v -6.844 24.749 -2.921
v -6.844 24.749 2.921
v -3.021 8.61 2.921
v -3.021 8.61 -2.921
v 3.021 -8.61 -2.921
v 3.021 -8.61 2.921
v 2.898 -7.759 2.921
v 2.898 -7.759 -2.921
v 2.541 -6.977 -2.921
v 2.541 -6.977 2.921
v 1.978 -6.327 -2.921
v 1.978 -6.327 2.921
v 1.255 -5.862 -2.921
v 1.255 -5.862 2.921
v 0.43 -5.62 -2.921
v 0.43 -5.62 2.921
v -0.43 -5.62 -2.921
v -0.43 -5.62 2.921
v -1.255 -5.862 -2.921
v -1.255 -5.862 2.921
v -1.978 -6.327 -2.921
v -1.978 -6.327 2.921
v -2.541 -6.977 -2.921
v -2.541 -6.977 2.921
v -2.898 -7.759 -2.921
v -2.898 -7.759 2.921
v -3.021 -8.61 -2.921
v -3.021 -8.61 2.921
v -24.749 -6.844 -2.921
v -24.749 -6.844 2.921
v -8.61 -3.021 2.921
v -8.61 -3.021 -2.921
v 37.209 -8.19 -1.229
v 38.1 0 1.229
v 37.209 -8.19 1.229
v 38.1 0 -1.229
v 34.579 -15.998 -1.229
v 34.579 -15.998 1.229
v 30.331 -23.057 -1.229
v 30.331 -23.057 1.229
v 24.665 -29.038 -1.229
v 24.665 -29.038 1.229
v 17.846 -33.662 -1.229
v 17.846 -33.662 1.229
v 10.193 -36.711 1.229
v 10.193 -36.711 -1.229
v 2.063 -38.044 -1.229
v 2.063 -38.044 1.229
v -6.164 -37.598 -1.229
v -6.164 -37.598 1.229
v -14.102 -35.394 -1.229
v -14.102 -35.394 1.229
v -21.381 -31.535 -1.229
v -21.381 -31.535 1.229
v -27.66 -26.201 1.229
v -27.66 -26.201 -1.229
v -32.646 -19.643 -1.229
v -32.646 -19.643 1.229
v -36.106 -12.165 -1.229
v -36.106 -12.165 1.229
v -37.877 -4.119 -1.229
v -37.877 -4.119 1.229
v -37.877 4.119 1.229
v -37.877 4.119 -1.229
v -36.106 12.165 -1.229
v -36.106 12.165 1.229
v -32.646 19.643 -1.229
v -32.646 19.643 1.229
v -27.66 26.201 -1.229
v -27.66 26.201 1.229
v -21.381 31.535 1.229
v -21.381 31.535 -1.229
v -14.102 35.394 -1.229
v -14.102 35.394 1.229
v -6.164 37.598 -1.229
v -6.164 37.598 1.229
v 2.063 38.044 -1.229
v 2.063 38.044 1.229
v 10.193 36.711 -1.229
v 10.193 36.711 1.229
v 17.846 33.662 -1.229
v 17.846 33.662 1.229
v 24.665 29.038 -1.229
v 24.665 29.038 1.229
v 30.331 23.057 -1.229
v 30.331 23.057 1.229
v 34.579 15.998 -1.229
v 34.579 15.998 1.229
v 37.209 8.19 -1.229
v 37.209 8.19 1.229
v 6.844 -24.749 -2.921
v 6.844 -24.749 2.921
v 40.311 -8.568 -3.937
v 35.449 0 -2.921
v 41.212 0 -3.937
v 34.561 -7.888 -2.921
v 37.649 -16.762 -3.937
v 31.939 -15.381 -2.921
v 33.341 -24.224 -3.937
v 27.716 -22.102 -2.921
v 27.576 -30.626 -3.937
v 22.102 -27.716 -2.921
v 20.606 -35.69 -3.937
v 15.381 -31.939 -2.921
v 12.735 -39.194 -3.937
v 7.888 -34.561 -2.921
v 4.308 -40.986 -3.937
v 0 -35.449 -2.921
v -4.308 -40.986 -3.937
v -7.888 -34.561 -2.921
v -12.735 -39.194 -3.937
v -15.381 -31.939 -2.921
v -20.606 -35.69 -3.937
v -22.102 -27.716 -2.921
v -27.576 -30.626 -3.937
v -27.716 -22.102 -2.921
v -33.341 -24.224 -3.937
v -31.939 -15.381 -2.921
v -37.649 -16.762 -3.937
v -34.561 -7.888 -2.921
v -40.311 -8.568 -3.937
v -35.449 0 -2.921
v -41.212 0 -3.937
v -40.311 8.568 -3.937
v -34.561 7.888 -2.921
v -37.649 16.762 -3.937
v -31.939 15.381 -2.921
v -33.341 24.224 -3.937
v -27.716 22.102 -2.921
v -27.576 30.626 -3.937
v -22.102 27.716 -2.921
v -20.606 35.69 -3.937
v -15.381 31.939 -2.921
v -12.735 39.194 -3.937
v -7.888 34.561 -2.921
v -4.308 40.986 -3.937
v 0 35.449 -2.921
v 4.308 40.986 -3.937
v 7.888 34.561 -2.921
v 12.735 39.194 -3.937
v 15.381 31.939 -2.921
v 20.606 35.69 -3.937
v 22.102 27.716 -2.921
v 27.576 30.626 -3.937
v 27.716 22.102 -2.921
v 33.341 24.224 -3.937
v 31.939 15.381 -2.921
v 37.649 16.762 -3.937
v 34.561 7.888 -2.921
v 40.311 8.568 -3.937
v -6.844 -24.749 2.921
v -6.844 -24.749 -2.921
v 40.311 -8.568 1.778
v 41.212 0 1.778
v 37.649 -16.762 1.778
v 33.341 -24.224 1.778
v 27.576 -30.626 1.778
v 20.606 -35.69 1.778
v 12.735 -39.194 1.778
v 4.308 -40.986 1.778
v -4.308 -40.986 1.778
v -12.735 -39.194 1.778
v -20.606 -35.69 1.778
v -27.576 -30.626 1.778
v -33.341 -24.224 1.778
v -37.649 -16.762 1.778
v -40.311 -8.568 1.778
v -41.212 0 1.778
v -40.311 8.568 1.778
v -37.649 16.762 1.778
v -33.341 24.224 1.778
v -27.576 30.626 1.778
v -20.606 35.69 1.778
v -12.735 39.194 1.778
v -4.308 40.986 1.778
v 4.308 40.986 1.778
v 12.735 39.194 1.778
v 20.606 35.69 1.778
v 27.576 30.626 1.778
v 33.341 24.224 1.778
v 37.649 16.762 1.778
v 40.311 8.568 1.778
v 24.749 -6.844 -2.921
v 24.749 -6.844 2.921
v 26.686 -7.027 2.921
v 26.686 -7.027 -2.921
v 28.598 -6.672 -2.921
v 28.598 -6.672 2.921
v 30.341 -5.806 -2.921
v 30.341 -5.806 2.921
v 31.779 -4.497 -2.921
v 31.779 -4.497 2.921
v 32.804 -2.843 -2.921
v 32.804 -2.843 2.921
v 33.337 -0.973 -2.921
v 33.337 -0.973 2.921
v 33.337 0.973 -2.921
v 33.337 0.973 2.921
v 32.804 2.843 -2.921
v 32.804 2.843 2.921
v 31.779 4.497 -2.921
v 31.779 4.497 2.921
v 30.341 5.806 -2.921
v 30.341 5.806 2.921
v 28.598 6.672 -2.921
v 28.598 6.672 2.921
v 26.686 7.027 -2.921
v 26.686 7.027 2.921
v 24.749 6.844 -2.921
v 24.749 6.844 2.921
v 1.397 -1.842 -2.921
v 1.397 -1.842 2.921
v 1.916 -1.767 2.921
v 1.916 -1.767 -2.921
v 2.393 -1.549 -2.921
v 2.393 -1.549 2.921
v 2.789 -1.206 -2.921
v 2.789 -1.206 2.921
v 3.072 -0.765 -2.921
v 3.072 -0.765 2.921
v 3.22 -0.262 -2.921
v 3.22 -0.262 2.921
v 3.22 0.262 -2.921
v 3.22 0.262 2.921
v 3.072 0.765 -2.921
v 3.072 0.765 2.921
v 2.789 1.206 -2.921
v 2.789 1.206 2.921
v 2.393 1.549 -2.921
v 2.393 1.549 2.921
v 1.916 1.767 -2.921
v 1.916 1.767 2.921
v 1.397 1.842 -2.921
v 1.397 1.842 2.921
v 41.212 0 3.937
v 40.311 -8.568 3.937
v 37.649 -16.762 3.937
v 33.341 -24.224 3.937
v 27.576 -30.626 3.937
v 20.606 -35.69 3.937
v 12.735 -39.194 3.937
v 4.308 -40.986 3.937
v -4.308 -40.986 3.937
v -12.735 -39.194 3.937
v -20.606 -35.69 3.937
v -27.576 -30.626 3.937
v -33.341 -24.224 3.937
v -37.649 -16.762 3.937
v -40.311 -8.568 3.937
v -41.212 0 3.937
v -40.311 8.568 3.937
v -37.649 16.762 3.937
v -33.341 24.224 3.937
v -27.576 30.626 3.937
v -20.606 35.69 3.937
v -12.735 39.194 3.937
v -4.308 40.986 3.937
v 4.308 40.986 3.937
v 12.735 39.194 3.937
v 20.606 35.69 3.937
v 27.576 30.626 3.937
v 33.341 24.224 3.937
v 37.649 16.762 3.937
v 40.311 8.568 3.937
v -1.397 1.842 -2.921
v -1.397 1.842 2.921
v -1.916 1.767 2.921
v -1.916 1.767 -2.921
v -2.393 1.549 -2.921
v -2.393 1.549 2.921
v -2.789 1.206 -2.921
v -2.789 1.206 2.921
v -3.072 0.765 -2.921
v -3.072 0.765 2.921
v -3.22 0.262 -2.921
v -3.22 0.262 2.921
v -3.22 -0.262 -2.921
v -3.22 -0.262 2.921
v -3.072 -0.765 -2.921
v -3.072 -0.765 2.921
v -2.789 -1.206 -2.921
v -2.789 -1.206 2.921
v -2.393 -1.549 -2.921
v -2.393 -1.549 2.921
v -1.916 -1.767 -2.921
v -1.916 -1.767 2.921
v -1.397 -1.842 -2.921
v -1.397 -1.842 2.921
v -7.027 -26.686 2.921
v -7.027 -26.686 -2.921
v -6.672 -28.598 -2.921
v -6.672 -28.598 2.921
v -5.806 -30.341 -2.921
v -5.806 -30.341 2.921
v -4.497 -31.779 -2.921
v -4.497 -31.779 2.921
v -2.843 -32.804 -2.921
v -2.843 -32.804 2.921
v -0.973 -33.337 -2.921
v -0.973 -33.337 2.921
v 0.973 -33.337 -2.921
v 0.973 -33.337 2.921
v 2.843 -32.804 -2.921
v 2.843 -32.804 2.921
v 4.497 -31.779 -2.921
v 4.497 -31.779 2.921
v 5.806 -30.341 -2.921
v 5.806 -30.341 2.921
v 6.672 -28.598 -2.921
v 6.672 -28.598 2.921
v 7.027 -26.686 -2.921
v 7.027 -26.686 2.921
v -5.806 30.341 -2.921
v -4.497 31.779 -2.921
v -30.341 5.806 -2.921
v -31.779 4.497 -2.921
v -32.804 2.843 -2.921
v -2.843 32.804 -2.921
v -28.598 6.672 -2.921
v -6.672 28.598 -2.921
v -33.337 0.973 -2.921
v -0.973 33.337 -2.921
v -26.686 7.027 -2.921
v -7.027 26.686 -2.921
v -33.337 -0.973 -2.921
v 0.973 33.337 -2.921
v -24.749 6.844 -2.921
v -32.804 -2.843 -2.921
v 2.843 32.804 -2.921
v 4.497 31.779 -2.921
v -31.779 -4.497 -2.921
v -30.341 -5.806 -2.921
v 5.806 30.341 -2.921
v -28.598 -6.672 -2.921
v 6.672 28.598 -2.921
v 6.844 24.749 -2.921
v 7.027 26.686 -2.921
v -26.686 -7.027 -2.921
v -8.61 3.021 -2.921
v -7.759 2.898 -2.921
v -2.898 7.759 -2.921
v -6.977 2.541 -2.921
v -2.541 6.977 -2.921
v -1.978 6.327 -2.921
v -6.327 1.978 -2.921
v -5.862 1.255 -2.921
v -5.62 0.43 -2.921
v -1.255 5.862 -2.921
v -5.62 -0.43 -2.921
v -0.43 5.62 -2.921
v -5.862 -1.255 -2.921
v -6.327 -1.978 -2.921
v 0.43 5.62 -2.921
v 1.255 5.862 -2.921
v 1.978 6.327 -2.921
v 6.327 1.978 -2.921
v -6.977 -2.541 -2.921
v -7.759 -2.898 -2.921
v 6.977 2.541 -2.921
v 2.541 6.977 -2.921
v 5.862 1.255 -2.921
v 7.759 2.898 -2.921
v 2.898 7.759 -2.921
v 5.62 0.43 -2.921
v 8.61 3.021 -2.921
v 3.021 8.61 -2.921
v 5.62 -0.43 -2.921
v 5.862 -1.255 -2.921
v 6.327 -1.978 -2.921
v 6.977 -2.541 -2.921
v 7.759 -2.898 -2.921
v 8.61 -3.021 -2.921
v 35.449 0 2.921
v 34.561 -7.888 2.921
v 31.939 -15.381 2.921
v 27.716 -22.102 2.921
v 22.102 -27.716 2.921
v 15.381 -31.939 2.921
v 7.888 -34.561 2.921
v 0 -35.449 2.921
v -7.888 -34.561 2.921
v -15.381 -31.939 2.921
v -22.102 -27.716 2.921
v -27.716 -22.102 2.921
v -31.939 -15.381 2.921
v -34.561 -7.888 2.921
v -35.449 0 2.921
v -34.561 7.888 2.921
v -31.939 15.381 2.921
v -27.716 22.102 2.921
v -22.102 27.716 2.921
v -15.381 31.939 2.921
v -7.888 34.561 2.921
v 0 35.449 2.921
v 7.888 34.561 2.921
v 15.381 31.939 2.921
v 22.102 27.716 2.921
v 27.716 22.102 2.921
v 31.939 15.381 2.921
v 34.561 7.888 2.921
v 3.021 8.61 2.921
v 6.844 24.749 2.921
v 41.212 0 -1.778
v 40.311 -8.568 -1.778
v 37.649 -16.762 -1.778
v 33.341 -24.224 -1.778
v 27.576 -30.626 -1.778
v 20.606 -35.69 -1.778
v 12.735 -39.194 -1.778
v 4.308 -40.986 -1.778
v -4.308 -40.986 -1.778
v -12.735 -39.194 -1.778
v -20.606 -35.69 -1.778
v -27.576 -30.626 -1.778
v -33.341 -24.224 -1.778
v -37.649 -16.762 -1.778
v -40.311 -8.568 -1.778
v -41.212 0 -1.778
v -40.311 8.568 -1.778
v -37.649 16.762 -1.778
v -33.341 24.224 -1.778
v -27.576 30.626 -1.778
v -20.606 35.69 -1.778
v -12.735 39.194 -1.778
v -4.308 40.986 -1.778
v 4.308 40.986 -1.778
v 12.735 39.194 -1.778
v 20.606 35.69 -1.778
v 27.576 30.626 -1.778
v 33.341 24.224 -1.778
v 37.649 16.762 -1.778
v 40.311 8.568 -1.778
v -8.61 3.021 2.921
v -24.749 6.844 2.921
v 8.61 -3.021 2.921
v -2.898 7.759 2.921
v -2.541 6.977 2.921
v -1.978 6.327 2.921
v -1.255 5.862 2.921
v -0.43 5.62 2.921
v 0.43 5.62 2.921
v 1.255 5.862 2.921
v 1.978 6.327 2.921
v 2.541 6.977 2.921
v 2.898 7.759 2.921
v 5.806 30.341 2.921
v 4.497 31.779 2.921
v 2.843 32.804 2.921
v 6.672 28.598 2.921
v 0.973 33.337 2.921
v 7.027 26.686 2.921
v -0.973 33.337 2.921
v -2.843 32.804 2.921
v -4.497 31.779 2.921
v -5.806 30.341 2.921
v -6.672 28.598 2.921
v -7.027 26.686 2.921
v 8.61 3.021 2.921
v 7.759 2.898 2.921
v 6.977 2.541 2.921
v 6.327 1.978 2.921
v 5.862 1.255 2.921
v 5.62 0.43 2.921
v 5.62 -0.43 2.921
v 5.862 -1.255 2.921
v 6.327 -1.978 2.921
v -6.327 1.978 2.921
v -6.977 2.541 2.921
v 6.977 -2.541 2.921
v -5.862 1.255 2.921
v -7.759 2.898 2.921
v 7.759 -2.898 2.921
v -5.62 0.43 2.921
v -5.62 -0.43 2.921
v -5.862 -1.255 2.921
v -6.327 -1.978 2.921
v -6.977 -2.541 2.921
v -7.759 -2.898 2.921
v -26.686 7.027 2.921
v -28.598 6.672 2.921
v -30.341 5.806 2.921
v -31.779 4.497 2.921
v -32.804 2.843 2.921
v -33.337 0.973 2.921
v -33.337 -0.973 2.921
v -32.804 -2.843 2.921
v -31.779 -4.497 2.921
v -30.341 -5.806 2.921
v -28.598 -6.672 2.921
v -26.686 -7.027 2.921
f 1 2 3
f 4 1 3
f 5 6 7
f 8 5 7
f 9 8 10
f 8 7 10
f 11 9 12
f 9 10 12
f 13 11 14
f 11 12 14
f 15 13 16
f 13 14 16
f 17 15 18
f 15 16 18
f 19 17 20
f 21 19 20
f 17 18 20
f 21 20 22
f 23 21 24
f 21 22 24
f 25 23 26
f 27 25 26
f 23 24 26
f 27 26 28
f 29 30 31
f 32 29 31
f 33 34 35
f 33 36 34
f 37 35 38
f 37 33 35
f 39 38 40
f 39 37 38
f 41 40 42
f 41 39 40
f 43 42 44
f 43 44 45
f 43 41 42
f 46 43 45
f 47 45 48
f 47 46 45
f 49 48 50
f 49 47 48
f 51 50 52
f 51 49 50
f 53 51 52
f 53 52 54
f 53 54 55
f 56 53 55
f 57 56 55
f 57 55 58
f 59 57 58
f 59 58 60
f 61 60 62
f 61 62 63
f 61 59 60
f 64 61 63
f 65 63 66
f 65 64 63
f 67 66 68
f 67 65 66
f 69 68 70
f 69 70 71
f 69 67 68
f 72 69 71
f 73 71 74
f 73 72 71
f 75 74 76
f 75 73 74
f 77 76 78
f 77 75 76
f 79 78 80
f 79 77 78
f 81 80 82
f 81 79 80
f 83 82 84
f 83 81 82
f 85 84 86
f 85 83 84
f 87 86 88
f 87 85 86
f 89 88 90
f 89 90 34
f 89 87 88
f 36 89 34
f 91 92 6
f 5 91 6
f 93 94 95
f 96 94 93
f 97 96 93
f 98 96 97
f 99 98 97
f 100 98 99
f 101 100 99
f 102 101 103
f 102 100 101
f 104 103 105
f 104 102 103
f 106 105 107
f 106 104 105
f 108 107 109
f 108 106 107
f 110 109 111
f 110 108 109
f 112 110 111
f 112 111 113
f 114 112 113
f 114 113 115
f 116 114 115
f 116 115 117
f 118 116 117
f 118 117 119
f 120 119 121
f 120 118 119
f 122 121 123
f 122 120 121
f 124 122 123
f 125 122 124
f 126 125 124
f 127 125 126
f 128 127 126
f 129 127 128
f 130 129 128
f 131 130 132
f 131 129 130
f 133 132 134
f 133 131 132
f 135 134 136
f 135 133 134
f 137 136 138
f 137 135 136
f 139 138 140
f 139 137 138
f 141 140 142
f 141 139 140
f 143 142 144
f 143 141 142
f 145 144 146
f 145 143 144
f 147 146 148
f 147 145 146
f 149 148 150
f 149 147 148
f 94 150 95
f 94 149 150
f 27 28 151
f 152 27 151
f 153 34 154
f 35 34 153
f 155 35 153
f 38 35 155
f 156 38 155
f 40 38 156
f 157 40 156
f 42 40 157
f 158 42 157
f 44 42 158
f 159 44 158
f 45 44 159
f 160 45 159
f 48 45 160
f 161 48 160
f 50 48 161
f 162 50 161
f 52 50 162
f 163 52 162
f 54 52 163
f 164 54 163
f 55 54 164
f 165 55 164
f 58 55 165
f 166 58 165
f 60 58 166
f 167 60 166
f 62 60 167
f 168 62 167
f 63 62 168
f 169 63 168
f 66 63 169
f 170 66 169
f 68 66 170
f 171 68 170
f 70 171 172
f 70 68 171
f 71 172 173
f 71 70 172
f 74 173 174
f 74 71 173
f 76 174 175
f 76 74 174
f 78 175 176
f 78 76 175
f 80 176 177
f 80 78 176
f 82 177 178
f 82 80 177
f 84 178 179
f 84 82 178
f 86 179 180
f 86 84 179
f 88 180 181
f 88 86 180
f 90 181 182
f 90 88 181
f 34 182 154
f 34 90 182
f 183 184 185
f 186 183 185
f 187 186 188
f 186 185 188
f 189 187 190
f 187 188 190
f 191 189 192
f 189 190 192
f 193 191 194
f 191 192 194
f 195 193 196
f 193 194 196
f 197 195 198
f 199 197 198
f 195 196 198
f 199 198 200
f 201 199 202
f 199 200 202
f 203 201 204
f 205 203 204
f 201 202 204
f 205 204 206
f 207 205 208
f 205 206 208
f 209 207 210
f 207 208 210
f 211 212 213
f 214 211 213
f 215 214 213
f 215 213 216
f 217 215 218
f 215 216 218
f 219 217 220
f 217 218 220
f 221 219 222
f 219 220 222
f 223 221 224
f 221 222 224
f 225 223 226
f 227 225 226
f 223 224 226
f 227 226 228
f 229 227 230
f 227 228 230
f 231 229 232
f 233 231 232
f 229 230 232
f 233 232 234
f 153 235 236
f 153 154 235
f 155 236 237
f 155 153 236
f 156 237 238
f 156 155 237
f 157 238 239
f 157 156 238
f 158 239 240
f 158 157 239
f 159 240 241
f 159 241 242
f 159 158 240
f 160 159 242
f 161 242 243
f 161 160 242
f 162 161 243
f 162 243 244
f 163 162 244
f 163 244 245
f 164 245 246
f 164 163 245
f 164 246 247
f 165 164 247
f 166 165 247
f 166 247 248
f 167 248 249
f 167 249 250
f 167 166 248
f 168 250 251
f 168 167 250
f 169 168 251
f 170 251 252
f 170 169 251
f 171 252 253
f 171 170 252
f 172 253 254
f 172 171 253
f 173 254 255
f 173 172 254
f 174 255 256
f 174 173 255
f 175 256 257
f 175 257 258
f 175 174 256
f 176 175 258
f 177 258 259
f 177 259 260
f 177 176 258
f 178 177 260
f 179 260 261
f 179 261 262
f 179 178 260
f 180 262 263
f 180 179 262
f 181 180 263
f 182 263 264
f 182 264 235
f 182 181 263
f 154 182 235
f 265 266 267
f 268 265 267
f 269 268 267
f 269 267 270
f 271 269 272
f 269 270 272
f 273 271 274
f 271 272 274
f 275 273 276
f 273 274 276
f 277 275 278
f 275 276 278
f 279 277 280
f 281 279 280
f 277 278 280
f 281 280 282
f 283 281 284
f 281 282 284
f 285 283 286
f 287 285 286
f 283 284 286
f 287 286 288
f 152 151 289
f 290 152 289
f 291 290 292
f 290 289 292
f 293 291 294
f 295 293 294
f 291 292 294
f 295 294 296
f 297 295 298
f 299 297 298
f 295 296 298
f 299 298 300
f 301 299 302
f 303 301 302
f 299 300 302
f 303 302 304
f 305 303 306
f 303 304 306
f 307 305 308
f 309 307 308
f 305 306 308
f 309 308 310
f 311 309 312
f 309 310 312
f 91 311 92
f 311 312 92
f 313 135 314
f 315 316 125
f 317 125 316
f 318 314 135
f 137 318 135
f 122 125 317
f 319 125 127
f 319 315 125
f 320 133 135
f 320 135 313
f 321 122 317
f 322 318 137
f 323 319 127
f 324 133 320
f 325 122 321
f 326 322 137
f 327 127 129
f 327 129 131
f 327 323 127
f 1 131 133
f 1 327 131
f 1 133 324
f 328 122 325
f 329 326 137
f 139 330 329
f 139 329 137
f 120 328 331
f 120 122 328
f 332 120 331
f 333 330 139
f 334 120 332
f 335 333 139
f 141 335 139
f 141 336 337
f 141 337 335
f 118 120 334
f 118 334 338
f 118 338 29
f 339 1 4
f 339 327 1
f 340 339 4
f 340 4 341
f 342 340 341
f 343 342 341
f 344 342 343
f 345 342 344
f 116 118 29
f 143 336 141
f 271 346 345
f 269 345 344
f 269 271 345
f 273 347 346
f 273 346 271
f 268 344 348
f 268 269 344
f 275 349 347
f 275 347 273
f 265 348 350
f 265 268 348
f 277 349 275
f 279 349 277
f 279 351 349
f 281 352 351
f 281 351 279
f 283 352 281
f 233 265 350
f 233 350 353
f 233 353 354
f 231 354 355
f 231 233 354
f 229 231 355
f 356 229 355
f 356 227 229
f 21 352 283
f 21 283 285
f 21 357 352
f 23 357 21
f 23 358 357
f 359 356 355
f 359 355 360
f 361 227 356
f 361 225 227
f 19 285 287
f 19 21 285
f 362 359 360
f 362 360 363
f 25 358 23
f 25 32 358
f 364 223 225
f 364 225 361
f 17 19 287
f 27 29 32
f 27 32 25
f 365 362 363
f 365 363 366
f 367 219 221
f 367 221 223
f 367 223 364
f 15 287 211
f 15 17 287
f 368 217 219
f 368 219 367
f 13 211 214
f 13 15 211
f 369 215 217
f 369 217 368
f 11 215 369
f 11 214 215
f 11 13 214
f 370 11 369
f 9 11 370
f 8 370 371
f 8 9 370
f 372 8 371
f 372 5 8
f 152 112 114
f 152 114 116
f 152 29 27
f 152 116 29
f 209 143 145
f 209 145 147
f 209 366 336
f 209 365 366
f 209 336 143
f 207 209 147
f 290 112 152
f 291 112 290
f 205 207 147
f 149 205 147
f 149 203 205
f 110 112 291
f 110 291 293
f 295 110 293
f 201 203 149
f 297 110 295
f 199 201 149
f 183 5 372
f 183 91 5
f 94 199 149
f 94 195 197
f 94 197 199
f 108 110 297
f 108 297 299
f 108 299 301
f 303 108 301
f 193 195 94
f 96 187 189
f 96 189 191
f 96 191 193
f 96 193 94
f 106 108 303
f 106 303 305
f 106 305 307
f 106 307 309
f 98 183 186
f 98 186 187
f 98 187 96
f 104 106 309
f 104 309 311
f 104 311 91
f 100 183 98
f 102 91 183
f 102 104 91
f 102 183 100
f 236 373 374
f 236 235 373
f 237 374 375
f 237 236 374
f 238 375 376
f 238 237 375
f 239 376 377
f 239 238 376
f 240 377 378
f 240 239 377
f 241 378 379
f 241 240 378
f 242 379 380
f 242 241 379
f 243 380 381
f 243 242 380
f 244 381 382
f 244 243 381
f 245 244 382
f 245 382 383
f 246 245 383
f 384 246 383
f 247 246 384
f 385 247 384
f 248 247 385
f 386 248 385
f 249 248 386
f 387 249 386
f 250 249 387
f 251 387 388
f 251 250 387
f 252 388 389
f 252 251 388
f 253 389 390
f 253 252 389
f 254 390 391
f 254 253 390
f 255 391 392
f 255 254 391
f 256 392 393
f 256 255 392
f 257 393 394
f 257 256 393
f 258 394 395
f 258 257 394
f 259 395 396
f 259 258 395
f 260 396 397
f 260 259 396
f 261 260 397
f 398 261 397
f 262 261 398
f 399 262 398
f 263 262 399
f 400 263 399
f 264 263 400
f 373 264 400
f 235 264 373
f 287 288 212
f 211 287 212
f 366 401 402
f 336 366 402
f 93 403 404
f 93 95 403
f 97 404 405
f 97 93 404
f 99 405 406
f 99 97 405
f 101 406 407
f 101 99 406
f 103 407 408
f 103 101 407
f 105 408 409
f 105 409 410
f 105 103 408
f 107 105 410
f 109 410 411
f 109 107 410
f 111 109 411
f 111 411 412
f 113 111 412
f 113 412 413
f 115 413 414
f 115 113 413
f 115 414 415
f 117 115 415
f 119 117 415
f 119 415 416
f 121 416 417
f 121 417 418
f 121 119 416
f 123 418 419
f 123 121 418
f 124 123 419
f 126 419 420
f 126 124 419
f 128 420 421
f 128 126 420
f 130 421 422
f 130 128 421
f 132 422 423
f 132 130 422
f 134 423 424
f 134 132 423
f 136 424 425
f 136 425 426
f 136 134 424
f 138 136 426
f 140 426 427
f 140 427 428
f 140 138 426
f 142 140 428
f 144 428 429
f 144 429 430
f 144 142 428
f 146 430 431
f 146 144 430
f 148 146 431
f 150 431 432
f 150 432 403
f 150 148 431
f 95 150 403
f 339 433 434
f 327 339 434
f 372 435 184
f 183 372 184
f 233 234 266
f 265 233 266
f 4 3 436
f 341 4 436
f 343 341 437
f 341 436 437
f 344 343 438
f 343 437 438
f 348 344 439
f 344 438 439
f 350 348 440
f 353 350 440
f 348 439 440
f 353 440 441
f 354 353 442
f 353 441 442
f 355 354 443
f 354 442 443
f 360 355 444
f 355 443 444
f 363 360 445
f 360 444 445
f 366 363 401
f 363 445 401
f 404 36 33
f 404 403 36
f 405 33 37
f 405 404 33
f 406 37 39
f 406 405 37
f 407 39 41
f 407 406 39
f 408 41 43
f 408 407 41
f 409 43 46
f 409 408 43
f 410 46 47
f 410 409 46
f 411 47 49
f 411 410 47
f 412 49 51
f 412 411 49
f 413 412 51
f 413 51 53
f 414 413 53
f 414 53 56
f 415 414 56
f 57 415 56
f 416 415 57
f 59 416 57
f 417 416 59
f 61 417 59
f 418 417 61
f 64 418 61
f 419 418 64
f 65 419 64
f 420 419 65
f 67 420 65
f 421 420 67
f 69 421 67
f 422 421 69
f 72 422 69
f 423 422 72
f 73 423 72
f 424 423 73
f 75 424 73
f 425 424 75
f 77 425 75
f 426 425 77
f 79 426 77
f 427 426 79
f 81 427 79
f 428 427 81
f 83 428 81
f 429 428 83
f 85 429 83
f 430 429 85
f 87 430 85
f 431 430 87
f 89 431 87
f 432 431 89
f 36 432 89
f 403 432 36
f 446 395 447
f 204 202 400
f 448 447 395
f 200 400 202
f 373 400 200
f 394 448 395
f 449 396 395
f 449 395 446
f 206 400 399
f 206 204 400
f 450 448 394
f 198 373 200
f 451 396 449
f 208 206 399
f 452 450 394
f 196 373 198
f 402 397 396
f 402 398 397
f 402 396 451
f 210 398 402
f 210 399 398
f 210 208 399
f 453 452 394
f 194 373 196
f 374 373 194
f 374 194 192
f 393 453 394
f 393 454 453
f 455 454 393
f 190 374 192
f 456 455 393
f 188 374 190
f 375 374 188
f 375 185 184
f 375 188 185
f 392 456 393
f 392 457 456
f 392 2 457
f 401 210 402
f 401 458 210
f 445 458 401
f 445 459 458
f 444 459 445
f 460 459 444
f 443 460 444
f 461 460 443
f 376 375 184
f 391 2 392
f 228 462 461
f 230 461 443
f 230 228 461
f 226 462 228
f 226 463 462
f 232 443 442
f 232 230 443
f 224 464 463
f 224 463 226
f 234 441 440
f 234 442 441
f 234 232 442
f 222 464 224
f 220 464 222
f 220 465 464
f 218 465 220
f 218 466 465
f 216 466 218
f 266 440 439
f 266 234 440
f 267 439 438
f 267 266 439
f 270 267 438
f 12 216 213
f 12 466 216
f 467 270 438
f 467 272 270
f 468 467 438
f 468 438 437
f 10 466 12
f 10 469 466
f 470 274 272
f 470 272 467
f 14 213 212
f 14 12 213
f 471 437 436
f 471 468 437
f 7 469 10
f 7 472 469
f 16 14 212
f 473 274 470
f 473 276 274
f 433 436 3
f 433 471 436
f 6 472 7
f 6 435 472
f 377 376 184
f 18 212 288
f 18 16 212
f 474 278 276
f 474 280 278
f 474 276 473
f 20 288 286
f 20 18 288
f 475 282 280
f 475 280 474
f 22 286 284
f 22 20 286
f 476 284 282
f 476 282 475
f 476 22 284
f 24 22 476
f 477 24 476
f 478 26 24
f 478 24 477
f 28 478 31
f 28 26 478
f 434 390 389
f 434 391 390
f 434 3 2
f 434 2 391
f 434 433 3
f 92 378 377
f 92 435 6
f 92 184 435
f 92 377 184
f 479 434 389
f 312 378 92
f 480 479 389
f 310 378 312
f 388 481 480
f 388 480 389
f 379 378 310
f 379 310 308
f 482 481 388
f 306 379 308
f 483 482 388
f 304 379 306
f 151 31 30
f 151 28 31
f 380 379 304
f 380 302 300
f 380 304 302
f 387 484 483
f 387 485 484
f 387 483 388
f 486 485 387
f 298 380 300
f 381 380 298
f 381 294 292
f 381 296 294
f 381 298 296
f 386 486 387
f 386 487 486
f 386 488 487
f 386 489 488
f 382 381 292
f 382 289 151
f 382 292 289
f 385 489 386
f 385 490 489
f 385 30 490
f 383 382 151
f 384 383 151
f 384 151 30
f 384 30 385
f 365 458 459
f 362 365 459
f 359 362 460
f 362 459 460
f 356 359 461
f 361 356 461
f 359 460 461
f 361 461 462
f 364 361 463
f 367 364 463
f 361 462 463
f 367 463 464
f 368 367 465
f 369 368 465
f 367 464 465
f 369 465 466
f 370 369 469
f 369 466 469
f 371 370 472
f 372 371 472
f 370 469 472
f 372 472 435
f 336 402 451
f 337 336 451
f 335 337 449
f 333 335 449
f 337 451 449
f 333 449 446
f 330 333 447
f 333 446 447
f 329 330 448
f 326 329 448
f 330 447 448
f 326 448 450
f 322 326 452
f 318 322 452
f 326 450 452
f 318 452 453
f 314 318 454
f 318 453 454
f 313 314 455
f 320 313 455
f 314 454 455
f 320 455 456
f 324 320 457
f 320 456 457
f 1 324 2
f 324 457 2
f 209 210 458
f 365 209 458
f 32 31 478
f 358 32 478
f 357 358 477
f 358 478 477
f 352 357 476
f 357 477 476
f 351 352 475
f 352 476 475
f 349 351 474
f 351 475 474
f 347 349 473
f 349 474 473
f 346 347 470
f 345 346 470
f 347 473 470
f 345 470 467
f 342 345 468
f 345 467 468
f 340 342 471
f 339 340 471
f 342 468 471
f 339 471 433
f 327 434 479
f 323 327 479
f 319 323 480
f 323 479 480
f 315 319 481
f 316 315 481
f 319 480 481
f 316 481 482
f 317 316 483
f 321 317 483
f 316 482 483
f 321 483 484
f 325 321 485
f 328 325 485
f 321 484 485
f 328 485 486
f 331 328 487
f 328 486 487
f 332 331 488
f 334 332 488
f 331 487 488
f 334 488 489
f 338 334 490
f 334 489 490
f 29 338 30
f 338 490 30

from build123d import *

# Parameters (mm, degrees)
CUT_EXTRUDE3_DEPTH = 59.683963981
CUT_EXTRUDE4_DEPTH = 59.683963981
CIRPATTERN1_COUNT  = 4


with BuildPart() as part:
    # Sketch1 → Revolve1 (revolve)
    with BuildSketch(Plane(origin=(0, 0, 0), x_dir=(0, 0, -1), z_dir=(1, 0, 0)), mode=Mode.PRIVATE) as revolve1_sk:
        Polygon((-2.921, 35.449477671), (-3.937, 41.2115), (-1.778, 41.2115), (-1.2293586, 38.1), (1.2293586, 38.1), (1.778, 41.2115), (3.937, 41.2115), (2.921, 35.449477671), (2.921, 0), (-2.921, 0), align=None)
    revolve(revolve1_sk.sketch.rotate(Axis((0, 0, 2.921), (0, 0, -1)), 90), axis=Axis((0, 0, 2.921), (0, 0, -1)))

    # Sketch4 → Cut-Extrude3 (cut, through all)
    with BuildSketch(Plane(origin=(0, 0, 2.921), x_dir=(-1, 0, 0), z_dir=(0, 0, -1))):
        with BuildLine():
            Line((-3.020640994, 8.609785057), (-6.844218669, 24.749140517))
            ThreePointArc((-6.844218669, 24.749140517), (0, 33.404273107), (6.844218669, 24.749140517))
            Line((6.844218669, 24.749140517), (3.020640994, 8.609785057))
            ThreePointArc((3.020640994, 8.609785057), (0, 5.589144063), (-3.020640994, 8.609785057))
        make_face()
    cut_extrude3 = extrude(amount=CUT_EXTRUDE3_DEPTH, mode=Mode.SUBTRACT)

    # Sketch2 → Cut-Extrude4 (cut, through all)
    with BuildSketch(Plane(origin=(0, 0, 2.921), x_dir=(-1, 0, 0), z_dir=(0, 0, -1))):
        with BuildLine():
            Line((-1.397, 1.8415), (1.397, 1.8415))
            ThreePointArc((1.397, 1.8415), (3.2385, 0), (1.397, -1.8415))
            Line((1.397, -1.8415), (-1.397, -1.8415))
            ThreePointArc((-1.397, -1.8415), (-3.2385, 0), (-1.397, 1.8415))
        make_face()
    extrude(amount=CUT_EXTRUDE4_DEPTH, mode=Mode.SUBTRACT)

    # CirPattern1: Cut-Extrude3 ×4 about axis
    cirpattern1_axis = Axis((0, 0, 0), (0, 0, 1))
    for i in range(1, CIRPATTERN1_COUNT):
        add(cut_extrude3.rotate(cirpattern1_axis, i * 360 / CIRPATTERN1_COUNT), mode=Mode.SUBTRACT)


solid = part.part
